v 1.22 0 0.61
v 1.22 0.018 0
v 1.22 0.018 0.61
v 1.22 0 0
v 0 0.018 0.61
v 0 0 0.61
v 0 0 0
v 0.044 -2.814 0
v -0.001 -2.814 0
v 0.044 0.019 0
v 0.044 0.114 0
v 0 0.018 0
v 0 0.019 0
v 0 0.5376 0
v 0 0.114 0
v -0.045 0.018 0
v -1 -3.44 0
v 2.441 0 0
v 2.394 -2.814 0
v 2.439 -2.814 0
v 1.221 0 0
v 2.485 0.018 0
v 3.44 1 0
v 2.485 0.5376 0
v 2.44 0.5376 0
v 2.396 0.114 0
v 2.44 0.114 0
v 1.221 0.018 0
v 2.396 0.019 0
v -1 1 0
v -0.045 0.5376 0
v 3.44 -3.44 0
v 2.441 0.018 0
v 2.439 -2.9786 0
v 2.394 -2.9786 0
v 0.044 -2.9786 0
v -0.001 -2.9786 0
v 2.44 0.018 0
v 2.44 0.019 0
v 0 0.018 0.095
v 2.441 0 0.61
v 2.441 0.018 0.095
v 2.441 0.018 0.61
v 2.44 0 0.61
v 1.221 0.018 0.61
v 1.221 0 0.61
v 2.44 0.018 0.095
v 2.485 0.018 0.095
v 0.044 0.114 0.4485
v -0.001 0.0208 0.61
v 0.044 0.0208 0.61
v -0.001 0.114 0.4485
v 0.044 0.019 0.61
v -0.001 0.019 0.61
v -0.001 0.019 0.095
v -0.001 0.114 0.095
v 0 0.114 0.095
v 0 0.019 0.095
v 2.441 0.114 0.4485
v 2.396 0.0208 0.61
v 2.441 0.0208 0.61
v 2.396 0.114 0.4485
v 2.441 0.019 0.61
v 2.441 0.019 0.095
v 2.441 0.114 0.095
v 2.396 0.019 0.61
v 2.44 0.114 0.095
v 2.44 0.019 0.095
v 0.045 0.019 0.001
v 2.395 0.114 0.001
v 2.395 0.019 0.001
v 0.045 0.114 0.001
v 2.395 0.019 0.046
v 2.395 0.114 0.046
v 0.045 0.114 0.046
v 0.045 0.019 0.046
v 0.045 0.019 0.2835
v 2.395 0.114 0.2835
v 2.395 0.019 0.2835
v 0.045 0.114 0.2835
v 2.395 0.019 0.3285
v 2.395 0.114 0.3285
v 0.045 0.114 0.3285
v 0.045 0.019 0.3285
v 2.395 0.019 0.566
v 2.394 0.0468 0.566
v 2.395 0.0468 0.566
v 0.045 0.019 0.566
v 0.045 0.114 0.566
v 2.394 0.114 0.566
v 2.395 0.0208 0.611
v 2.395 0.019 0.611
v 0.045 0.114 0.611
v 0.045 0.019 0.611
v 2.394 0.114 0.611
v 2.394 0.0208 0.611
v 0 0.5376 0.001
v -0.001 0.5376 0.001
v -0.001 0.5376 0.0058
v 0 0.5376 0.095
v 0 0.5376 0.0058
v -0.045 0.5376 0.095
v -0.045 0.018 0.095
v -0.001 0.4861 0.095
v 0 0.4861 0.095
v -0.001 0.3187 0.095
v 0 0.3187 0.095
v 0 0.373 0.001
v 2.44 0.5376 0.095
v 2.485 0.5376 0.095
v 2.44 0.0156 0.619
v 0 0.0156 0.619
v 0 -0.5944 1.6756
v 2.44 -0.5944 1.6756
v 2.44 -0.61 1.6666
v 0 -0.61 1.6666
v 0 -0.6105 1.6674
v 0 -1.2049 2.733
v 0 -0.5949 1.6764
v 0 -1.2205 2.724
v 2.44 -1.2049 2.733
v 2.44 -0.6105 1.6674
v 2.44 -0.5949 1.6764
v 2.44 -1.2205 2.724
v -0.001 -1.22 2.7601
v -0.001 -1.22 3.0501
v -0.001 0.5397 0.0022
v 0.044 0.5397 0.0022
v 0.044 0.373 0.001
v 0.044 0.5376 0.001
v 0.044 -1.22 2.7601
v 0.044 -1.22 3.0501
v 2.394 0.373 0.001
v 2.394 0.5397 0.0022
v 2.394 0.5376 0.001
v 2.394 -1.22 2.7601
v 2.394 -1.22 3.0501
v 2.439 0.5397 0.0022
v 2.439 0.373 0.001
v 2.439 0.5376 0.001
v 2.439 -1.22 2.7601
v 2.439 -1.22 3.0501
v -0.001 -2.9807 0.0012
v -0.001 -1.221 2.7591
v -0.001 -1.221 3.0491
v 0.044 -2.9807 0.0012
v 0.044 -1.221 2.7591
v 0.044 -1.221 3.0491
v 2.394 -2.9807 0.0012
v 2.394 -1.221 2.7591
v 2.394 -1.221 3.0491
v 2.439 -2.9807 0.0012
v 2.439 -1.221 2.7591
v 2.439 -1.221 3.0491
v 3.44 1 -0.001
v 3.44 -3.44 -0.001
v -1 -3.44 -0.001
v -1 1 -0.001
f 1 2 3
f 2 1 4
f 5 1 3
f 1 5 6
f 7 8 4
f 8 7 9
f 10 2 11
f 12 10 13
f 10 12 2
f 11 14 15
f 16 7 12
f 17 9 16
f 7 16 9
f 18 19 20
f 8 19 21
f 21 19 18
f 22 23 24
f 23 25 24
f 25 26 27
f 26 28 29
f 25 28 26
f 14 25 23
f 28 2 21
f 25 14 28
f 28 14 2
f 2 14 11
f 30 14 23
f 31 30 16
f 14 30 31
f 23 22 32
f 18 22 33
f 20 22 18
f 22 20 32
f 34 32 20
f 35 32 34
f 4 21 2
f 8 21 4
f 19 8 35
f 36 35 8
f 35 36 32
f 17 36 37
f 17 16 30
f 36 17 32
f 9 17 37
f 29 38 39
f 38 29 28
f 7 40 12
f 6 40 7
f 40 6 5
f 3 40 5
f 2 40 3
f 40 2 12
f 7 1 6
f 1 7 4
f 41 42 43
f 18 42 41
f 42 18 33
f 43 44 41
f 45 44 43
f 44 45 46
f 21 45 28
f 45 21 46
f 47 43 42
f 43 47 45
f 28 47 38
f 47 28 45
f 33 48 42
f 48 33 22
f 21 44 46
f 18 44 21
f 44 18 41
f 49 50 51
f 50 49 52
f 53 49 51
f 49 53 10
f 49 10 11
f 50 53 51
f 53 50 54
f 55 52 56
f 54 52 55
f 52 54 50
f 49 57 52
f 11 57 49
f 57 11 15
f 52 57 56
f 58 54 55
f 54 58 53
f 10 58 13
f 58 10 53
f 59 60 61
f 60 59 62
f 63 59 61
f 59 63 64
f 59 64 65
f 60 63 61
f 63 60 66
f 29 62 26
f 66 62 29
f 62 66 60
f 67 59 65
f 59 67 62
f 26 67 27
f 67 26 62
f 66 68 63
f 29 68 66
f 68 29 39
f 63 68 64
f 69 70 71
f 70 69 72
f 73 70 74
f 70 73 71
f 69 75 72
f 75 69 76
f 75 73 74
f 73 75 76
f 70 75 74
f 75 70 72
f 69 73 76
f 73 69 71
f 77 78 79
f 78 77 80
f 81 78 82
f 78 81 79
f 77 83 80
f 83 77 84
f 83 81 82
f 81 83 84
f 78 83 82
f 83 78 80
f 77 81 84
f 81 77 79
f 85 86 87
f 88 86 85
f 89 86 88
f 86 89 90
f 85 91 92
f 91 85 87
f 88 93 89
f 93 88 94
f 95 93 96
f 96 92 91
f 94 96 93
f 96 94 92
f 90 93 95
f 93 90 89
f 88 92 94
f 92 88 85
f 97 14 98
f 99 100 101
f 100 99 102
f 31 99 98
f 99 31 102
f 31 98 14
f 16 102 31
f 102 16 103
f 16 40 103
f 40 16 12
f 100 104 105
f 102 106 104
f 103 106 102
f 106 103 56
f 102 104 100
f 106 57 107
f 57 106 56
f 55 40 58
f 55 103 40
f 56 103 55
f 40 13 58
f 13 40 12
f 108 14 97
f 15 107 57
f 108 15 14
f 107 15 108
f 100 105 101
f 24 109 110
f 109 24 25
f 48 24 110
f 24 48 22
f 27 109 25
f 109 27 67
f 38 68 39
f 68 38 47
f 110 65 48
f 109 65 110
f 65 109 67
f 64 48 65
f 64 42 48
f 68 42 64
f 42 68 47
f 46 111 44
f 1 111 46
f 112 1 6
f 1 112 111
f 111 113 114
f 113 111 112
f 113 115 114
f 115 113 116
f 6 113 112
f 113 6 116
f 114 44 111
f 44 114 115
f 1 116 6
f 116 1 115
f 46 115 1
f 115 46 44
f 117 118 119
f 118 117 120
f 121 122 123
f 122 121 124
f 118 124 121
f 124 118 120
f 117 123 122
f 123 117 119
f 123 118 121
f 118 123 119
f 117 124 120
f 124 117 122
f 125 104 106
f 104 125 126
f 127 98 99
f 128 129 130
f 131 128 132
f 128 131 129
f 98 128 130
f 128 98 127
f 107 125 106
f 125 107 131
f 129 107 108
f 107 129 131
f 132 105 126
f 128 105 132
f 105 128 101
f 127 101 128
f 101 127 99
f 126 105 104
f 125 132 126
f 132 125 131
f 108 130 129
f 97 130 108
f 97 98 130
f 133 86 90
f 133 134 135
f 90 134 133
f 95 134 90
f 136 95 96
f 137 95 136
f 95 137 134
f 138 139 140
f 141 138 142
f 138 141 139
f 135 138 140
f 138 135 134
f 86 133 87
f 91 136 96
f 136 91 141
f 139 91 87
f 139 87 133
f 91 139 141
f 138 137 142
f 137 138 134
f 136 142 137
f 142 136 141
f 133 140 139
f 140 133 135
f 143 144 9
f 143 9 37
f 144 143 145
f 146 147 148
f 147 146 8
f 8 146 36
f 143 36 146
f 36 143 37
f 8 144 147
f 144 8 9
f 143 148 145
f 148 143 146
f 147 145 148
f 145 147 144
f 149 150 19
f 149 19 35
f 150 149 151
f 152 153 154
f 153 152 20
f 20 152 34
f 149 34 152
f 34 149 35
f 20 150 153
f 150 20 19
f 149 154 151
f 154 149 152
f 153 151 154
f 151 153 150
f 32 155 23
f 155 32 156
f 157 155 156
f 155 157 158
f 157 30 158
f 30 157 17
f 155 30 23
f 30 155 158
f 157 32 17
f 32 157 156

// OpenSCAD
angle = 30;
gap = 0.001;

ply_thickness = 0.018;

ply_8 = 2.44;
ply_4 = 1.22;
ply_2 = 0.61;

beam_2 = 0.045;
beam_4 = 0.095;
beam_6 = 0.145;

ply_color = "#DAB888";
beam_color = "#AE936D";

module ply_2x4() {
    color(ply_color)
    cube([ply_4, ply_thickness, ply_2]);
}

module ply_4x8() {
    color(ply_color)
    cube([ply_8, ply_thickness, ply_4]);
}

module beam_2x4(length) {
    color(beam_color)
        cube([beam_2, beam_4, length]);
}

module beam_2x6(length) {
    color(beam_color)
        cube([beam_2, beam_6, length]);
}

module floor(thickness) {
    color("green")
        translate([-1, -1 - 2 * ply_8 * sin(angle), -thickness])
        cube([ply_8 + 2, 2 * ply_8 * sin(angle) + 2, thickness]);
}

module overhang_edge_beam(i) {
    difference() {
        translate([(ply_8 - beam_2) * i, 0, ply_2])
            rotate([angle, 0, 0])
            translate([-gap, ply_thickness, -ply_thickness / 2])
            translate([0, 0, -beam_6 * tan(angle)])
            translate([0, 0, -ply_2 / cos(angle)])
            beam_2x6(ply_8 + (ply_2 / cos(angle)) + (ply_thickness / 2) + (beam_6 * tan(angle)) + 
                (beam_6 / tan(angle)) + (ply_thickness * cos(angle) / sin(angle)));
       
        translate([0, -ply_8 * sin(angle), 0])
            mirror([0, 1, 0])
            translate([-ply_2, 0, 0])
            color(beam_color)
            cube([ply_4 * 3, 1, ply_4 * 3]);
    }
}

module kickboard() {
    // ply wood
    for (i = [0 : 1]) {
        translate([(ply_4 + gap) * i, 0, 0])
            ply_2x4();
    }
    
    // vertical beams
    for (i = [0 : 1]) {
        difference() {
            translate([(2 * i * gap) - gap, gap, 0])
                translate([(ply_8 - beam_2) * i, ply_thickness, 0])
                beam_2x4(ply_2);

            translate([(beam_2 * i) - (beam_2 / 2) - (ply_8 * i), 0, 0])
                scale([2, 1, 1])
                overhang_edge_beam(i);
        }
    }
    
    // horizontal beams
    for (i = [0 : 2]) {
        translate([0, 0, (ply_2 - beam_2) * i / 2])
            translate([beam_2, ply_thickness + gap, beam_2 + gap])
            rotate([0, 90, 0])
            beam_2x4(ply_8 - (2 * beam_2));
    }
    
    // connectors to overhang edge beams
    for (i = [0 : 1]) {
        translate([(ply_8 + beam_2) * i, 0, 0])
            translate([-beam_2, ply_thickness, beam_4])
            rotate([-90, 0, 0])
            beam_2x4(ply_2 * tan(angle) + (beam_6 / cos(angle)));
    }
    
}

module overhang() {
    // ply wood
    for (i = [0 : 1]) {
        translate([0, 0, ply_2])
            rotate([angle, 0, 0])
            translate([0, 0, (ply_4 + gap) * i])
            ply_4x8();
    }
    
    // edge beams
    for (i = [0 : 1]) {
        translate([0, 0, gap])
            difference() {
                overhang_edge_beam(i);
                floor(1);
            }
    }
}

module aframe() {
    for (i = [0 : 1]) {
            translate([0, -gap, 0])
            translate([0, -ply_8 * sin(angle) * 2, 0])
            mirror([0, 1, 0])
            difference() {
                overhang_edge_beam(i);
                floor(1);
            }
    }
}

kickboard();
overhang();
aframe();
floor(gap);
